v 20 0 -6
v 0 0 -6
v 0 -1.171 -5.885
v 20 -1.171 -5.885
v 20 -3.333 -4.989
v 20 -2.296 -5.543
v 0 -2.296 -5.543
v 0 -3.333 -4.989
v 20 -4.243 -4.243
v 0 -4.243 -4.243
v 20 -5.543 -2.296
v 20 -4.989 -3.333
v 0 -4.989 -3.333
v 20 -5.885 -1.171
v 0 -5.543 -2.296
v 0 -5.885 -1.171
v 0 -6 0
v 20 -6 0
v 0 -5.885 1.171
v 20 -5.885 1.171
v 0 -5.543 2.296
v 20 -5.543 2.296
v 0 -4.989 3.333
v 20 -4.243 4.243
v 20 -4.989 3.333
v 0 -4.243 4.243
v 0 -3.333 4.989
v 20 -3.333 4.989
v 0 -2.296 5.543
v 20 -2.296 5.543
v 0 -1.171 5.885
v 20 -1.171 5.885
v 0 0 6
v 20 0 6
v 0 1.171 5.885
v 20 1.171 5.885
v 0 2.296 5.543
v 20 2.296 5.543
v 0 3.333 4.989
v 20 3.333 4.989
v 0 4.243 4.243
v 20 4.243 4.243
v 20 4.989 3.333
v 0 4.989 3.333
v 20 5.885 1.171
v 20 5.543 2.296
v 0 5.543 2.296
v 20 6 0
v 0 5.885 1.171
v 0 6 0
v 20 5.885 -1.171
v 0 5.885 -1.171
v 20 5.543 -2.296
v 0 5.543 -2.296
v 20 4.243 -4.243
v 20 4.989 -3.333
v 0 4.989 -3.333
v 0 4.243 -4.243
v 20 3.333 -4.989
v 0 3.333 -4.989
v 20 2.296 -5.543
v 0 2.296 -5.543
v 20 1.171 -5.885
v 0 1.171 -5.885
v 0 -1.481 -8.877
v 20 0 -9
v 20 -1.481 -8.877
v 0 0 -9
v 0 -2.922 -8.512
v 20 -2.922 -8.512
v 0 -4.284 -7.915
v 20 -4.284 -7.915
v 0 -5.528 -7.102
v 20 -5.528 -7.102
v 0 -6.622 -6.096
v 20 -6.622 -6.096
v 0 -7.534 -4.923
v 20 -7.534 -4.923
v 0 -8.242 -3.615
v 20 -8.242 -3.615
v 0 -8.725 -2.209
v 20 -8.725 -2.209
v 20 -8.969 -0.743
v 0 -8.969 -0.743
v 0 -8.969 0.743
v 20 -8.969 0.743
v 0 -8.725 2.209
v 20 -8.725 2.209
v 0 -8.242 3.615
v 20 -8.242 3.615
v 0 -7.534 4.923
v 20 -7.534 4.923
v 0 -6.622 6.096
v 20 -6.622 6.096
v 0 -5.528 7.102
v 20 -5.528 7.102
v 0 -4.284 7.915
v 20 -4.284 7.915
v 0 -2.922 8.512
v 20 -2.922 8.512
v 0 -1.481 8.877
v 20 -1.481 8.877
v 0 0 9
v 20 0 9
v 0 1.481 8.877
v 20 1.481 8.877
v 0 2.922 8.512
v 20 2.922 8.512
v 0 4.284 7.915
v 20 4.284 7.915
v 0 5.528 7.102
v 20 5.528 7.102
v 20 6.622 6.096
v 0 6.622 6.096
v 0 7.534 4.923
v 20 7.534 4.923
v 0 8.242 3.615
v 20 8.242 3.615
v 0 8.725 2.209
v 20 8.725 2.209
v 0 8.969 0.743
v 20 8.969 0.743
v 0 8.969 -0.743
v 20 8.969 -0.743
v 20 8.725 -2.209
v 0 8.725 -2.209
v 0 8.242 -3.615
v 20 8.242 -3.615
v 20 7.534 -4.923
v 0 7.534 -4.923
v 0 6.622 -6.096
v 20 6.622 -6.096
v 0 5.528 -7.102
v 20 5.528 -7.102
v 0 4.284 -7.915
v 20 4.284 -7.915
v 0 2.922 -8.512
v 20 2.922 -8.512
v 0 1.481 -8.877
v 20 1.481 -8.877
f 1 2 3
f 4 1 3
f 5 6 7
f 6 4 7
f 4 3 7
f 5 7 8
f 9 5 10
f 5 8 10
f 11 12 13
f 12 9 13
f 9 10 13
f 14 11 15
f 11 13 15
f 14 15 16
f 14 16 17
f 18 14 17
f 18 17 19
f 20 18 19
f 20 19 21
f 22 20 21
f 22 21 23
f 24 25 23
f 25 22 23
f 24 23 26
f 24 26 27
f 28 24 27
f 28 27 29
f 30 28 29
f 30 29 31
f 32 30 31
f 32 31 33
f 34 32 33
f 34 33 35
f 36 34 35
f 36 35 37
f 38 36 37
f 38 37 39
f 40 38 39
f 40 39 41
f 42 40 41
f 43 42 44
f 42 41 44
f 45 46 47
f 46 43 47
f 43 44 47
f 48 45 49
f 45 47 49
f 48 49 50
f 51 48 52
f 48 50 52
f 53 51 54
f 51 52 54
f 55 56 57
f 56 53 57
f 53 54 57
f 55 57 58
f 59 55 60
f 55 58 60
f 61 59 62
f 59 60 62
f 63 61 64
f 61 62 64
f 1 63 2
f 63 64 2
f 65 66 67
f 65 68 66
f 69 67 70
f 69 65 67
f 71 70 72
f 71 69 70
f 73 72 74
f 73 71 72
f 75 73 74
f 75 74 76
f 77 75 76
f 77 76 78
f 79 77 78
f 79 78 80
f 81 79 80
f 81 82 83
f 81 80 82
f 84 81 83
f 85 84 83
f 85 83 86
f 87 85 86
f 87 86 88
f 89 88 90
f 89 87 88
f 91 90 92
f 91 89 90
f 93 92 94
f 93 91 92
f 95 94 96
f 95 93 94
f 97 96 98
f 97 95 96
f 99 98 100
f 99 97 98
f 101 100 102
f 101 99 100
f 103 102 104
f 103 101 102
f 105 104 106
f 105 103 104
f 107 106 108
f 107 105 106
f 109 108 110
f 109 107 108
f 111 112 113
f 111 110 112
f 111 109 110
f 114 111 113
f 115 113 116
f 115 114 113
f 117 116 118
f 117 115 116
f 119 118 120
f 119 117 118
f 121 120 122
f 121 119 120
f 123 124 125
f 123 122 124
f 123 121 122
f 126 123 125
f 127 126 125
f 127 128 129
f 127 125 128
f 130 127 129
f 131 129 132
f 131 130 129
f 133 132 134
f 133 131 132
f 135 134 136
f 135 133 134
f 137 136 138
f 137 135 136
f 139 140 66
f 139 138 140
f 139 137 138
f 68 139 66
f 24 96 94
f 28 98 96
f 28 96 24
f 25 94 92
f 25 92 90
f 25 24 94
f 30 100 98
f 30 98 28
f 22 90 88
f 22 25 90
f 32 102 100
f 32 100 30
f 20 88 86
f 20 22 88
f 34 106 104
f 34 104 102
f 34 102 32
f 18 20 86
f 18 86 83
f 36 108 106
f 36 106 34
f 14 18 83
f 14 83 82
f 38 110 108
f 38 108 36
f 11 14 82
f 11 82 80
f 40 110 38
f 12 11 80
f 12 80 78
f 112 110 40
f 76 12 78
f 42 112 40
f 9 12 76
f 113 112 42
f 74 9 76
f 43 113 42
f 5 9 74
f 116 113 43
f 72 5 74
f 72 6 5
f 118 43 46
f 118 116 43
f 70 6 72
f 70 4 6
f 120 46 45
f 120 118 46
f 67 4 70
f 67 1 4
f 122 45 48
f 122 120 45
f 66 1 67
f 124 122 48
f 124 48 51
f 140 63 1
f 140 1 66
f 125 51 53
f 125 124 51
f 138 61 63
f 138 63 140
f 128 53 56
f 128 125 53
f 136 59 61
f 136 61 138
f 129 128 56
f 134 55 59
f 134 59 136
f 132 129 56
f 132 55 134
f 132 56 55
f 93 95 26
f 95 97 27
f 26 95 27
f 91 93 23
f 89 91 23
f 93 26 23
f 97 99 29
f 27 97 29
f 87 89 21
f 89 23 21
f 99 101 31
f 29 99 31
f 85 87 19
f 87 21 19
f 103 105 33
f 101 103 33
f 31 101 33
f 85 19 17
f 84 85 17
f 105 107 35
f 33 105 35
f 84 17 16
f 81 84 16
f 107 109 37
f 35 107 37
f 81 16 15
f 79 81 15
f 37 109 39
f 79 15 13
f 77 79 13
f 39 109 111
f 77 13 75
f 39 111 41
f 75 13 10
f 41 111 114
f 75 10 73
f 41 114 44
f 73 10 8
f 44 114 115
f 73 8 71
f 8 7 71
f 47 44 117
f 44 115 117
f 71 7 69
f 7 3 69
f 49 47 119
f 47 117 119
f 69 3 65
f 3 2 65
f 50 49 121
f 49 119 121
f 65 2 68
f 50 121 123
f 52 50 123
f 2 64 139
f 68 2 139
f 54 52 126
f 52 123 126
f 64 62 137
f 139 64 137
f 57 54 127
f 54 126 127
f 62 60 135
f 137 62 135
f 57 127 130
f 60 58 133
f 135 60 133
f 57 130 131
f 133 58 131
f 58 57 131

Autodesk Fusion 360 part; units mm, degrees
sketch "Sketch1" plane through (0, 0, 0) normal (1, 0, 0) x (0, 0, -1)
  circle A0 centre (0, 0) radius 6
  circle A1 centre (0, 0) radius 9
  dimension "d1" = 12
  dimension "d2" = 18
extrude "Extrude1" add sketch "Sketch1" along normal blind 20 makes body 1
copy_body "Body->Comp1" bodies 1 removing the originals makes body 2 in component "12x18x20 bushing"
component "12x18x20 bushing" placed x (1, 0, 0) y (0, 1, 0) z (0, 0, 1) at (0, 0, 0)
